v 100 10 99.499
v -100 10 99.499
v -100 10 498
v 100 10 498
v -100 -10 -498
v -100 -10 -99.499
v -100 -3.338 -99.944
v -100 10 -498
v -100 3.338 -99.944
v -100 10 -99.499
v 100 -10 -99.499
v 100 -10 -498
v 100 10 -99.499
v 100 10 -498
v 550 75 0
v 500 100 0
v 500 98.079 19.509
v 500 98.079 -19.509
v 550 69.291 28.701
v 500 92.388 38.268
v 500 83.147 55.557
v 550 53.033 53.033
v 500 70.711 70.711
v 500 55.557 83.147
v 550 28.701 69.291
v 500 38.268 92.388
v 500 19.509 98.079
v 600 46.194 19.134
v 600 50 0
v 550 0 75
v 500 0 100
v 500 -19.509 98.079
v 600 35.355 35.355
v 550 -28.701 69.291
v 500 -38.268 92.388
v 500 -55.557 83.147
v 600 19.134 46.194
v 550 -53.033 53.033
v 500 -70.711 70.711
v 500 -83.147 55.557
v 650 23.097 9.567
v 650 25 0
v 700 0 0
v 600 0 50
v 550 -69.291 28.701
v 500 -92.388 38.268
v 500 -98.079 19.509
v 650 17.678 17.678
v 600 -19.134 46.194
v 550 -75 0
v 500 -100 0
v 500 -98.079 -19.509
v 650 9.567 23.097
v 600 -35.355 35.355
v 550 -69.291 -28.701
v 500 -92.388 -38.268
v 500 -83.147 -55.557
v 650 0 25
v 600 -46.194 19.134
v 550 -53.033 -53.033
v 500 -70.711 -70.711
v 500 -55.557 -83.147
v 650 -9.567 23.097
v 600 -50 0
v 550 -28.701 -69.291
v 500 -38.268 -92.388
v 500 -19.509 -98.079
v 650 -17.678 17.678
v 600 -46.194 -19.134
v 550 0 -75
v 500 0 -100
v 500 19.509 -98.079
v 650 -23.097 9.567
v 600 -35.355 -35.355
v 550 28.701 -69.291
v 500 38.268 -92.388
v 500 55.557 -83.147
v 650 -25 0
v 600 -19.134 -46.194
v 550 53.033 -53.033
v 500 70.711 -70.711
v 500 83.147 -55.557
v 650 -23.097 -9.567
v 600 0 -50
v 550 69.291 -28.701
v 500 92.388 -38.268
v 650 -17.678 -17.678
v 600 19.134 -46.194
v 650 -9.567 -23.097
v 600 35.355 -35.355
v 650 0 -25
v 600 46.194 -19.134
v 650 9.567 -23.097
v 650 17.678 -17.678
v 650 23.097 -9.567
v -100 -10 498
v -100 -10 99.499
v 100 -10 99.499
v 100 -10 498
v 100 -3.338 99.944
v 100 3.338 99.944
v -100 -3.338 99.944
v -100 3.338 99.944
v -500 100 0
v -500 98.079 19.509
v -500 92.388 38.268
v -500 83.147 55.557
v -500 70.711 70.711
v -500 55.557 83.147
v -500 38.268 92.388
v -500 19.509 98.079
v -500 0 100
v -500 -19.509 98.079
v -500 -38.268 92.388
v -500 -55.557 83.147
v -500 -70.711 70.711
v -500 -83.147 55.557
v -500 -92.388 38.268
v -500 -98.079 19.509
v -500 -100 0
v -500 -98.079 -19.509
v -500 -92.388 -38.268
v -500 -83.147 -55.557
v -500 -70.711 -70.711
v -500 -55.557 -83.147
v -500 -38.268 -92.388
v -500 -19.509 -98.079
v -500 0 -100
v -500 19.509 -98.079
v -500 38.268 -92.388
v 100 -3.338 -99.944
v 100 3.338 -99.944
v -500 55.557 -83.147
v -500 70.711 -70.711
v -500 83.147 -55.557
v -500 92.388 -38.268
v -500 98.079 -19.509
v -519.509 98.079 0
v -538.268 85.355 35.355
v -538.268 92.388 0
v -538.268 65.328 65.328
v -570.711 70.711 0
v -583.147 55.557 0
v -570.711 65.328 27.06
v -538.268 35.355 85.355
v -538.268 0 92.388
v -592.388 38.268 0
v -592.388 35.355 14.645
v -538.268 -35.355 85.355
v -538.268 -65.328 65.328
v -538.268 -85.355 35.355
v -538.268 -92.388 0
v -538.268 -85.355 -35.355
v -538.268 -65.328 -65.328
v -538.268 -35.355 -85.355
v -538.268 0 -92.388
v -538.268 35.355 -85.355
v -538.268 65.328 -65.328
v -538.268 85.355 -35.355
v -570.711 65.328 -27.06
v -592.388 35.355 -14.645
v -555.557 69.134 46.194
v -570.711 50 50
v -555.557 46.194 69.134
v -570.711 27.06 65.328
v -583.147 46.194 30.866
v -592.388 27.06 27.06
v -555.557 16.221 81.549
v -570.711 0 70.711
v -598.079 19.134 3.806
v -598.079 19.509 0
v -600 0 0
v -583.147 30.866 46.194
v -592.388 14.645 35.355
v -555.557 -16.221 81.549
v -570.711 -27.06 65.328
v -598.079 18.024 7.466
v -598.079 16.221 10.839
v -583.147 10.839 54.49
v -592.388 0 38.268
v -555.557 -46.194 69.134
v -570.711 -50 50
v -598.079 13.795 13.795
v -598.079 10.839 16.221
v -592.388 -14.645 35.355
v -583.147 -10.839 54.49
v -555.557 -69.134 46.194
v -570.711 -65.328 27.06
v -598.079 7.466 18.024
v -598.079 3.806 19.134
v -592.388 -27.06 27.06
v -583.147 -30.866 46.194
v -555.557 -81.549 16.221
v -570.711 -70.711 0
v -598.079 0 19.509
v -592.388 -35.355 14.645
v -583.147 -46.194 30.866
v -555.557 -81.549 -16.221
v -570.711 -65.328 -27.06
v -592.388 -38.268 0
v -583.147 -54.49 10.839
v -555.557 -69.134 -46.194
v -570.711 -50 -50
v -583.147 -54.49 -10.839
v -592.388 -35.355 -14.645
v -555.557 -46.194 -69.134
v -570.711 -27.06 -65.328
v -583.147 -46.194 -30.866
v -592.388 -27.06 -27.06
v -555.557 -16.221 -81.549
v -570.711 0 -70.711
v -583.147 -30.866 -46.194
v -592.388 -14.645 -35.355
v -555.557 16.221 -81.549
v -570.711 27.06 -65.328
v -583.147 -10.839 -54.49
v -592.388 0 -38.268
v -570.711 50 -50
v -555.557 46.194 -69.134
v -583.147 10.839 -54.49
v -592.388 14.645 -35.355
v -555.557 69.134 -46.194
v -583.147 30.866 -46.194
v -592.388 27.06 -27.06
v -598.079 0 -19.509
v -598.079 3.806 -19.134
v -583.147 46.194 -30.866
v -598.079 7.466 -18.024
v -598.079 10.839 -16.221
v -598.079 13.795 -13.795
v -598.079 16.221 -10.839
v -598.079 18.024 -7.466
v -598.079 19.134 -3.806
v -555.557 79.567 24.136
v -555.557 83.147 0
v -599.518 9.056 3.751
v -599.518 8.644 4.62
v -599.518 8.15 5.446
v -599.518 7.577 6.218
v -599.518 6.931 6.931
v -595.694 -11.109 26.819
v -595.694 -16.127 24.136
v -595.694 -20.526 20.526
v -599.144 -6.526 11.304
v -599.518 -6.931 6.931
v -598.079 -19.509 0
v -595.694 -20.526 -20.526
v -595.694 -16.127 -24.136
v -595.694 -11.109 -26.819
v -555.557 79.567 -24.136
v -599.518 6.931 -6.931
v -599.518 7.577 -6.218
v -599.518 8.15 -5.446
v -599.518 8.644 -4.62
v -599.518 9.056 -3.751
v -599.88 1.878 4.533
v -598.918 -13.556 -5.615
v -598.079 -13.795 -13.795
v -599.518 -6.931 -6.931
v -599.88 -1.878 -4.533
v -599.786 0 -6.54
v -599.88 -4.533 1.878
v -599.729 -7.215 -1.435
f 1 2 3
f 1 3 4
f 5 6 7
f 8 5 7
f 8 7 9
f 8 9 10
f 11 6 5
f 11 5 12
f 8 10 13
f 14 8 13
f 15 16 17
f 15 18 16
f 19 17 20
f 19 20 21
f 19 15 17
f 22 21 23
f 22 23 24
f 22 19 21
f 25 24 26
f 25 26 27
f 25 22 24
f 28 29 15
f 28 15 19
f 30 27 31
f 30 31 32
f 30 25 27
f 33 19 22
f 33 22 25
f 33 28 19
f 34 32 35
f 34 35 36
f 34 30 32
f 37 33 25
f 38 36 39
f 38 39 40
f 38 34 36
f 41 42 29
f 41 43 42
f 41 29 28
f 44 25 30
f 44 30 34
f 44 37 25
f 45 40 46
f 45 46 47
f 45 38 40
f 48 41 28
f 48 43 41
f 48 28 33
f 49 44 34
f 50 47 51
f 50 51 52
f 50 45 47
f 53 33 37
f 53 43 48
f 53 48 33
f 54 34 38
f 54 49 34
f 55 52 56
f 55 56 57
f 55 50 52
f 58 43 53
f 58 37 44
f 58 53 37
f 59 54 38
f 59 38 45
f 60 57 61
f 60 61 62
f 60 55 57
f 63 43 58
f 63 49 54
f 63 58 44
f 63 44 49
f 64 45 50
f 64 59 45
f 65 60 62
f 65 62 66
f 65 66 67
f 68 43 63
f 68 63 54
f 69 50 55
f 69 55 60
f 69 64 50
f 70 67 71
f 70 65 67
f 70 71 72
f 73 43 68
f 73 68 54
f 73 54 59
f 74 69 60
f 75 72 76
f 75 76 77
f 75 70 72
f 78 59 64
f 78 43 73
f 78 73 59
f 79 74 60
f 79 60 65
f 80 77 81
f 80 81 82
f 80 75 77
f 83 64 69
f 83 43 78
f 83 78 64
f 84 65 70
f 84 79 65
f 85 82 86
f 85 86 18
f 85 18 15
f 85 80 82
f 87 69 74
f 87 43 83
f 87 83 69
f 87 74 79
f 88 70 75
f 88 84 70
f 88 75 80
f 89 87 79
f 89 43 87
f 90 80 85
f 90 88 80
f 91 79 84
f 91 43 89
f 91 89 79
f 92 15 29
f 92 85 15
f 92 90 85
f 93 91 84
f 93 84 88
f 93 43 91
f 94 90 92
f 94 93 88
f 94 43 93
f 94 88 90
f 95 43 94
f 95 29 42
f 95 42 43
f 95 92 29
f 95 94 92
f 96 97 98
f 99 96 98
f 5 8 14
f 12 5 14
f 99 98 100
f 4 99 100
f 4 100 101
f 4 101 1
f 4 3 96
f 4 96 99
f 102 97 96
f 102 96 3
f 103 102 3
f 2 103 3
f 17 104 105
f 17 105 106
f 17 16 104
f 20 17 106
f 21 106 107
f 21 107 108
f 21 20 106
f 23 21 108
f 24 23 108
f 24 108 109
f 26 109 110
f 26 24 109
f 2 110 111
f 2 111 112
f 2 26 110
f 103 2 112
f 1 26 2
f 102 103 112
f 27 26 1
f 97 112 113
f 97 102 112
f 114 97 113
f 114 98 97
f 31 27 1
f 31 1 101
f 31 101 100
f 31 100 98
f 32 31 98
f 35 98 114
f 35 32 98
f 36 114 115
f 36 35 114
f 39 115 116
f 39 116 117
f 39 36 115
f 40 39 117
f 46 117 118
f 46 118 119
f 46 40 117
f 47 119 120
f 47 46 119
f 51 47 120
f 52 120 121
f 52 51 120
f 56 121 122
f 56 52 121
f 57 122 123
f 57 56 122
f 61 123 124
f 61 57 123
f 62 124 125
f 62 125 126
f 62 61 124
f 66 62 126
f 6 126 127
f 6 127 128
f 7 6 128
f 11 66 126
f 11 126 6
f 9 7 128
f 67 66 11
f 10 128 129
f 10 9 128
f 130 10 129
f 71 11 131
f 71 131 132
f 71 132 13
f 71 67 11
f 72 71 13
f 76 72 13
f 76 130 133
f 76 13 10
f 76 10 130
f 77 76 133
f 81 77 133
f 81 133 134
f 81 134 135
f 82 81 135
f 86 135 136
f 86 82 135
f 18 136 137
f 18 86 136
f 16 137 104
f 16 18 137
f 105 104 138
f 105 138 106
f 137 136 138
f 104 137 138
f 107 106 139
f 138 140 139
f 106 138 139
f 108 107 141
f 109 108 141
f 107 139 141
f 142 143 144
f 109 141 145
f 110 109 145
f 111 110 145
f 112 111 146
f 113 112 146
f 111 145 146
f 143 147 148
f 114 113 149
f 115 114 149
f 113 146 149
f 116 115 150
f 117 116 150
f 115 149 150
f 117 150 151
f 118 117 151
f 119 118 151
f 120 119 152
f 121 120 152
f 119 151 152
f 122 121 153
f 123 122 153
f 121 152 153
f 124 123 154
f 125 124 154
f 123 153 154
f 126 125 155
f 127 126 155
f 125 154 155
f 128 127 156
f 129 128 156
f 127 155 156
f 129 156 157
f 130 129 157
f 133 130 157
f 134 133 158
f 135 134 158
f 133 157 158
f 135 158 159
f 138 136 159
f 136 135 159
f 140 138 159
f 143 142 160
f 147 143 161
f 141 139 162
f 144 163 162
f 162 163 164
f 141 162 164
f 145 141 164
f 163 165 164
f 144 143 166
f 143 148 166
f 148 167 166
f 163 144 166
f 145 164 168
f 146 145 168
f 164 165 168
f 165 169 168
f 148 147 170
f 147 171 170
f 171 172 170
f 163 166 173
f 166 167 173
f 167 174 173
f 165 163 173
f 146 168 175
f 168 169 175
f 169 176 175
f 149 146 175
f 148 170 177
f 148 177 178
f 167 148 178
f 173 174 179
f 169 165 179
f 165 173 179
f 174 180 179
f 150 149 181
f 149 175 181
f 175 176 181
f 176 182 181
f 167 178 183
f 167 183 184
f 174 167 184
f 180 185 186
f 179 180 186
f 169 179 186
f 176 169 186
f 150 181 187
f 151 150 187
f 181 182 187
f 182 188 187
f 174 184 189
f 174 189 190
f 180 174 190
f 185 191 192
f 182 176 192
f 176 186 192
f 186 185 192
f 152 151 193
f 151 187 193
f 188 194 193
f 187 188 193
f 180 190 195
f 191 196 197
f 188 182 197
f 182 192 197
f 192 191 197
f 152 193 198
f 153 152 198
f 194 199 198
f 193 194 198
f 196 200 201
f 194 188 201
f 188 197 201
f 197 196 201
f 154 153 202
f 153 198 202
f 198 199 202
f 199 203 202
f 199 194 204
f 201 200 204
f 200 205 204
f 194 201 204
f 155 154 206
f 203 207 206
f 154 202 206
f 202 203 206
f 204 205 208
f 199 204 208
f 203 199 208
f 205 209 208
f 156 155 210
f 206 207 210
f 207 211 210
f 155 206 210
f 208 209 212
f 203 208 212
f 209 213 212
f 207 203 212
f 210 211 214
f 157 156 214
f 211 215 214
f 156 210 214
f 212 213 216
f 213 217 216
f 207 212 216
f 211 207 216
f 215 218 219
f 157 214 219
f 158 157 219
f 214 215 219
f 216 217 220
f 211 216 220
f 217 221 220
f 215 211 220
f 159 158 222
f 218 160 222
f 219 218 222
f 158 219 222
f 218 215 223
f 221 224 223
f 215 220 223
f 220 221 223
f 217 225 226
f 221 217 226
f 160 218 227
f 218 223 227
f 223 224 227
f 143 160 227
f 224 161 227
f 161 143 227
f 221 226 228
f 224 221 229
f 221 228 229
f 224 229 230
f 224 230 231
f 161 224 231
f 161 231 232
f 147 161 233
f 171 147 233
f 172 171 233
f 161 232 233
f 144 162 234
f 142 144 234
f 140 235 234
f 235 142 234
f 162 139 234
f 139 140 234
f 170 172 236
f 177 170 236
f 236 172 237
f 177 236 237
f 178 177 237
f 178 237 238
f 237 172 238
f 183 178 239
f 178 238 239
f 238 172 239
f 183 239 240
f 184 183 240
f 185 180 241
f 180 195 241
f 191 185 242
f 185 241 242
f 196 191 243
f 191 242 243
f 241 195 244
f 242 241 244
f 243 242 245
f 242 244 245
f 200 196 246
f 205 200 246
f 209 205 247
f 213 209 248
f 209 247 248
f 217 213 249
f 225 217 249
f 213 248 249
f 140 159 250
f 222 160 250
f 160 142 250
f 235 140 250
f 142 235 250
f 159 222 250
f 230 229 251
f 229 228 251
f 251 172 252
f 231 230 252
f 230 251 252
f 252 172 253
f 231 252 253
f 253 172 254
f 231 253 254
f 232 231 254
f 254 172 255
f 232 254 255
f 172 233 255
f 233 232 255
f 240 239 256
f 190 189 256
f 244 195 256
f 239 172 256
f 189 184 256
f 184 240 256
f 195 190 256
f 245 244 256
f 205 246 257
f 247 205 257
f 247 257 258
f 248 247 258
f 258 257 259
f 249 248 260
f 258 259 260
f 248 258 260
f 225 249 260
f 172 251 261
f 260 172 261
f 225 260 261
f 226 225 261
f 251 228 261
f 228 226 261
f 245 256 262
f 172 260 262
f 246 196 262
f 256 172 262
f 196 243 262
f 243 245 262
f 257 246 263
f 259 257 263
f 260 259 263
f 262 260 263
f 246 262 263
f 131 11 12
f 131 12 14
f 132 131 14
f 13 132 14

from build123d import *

# Parameters (mm, degrees)
SKETCH004_W  = 200
SKETCH004_H  = 20
PAD_DEPTH    = 400
SKETCH005_W  = 200
SKETCH005_H  = 20
PAD001_DEPTH = 400


with BuildPart() as part:
    # Sketch → Revolution (revolve)
    with BuildSketch(Plane.XY):
        with BuildLine():
            Line((-500, 0), (500, 0))
            Line((500, 0), (700, 0))
            Line((500, 100), (700, 0))
            Line((-500, 100), (500, 100))
            ThreePointArc((-500, 100), (-570.710678, 70.710678), (-600, 0))
            Line((-500, 0), (-600, 0))
        make_face()
    revolve(axis=Axis((0, 0, 0), (1, 0, 0)))

    # Sketch004 → Pad (new body)
    with BuildSketch(Plane.XY.offset(98)):
        Rectangle(SKETCH004_W, SKETCH004_H)
    extrude(amount=PAD_DEPTH)

    # Sketch005 → Pad001 (join)
    with BuildSketch(Plane.XY.offset(-98)):
        Rectangle(SKETCH005_W, SKETCH005_H)
    extrude(amount=-PAD001_DEPTH)


solid = part.part
